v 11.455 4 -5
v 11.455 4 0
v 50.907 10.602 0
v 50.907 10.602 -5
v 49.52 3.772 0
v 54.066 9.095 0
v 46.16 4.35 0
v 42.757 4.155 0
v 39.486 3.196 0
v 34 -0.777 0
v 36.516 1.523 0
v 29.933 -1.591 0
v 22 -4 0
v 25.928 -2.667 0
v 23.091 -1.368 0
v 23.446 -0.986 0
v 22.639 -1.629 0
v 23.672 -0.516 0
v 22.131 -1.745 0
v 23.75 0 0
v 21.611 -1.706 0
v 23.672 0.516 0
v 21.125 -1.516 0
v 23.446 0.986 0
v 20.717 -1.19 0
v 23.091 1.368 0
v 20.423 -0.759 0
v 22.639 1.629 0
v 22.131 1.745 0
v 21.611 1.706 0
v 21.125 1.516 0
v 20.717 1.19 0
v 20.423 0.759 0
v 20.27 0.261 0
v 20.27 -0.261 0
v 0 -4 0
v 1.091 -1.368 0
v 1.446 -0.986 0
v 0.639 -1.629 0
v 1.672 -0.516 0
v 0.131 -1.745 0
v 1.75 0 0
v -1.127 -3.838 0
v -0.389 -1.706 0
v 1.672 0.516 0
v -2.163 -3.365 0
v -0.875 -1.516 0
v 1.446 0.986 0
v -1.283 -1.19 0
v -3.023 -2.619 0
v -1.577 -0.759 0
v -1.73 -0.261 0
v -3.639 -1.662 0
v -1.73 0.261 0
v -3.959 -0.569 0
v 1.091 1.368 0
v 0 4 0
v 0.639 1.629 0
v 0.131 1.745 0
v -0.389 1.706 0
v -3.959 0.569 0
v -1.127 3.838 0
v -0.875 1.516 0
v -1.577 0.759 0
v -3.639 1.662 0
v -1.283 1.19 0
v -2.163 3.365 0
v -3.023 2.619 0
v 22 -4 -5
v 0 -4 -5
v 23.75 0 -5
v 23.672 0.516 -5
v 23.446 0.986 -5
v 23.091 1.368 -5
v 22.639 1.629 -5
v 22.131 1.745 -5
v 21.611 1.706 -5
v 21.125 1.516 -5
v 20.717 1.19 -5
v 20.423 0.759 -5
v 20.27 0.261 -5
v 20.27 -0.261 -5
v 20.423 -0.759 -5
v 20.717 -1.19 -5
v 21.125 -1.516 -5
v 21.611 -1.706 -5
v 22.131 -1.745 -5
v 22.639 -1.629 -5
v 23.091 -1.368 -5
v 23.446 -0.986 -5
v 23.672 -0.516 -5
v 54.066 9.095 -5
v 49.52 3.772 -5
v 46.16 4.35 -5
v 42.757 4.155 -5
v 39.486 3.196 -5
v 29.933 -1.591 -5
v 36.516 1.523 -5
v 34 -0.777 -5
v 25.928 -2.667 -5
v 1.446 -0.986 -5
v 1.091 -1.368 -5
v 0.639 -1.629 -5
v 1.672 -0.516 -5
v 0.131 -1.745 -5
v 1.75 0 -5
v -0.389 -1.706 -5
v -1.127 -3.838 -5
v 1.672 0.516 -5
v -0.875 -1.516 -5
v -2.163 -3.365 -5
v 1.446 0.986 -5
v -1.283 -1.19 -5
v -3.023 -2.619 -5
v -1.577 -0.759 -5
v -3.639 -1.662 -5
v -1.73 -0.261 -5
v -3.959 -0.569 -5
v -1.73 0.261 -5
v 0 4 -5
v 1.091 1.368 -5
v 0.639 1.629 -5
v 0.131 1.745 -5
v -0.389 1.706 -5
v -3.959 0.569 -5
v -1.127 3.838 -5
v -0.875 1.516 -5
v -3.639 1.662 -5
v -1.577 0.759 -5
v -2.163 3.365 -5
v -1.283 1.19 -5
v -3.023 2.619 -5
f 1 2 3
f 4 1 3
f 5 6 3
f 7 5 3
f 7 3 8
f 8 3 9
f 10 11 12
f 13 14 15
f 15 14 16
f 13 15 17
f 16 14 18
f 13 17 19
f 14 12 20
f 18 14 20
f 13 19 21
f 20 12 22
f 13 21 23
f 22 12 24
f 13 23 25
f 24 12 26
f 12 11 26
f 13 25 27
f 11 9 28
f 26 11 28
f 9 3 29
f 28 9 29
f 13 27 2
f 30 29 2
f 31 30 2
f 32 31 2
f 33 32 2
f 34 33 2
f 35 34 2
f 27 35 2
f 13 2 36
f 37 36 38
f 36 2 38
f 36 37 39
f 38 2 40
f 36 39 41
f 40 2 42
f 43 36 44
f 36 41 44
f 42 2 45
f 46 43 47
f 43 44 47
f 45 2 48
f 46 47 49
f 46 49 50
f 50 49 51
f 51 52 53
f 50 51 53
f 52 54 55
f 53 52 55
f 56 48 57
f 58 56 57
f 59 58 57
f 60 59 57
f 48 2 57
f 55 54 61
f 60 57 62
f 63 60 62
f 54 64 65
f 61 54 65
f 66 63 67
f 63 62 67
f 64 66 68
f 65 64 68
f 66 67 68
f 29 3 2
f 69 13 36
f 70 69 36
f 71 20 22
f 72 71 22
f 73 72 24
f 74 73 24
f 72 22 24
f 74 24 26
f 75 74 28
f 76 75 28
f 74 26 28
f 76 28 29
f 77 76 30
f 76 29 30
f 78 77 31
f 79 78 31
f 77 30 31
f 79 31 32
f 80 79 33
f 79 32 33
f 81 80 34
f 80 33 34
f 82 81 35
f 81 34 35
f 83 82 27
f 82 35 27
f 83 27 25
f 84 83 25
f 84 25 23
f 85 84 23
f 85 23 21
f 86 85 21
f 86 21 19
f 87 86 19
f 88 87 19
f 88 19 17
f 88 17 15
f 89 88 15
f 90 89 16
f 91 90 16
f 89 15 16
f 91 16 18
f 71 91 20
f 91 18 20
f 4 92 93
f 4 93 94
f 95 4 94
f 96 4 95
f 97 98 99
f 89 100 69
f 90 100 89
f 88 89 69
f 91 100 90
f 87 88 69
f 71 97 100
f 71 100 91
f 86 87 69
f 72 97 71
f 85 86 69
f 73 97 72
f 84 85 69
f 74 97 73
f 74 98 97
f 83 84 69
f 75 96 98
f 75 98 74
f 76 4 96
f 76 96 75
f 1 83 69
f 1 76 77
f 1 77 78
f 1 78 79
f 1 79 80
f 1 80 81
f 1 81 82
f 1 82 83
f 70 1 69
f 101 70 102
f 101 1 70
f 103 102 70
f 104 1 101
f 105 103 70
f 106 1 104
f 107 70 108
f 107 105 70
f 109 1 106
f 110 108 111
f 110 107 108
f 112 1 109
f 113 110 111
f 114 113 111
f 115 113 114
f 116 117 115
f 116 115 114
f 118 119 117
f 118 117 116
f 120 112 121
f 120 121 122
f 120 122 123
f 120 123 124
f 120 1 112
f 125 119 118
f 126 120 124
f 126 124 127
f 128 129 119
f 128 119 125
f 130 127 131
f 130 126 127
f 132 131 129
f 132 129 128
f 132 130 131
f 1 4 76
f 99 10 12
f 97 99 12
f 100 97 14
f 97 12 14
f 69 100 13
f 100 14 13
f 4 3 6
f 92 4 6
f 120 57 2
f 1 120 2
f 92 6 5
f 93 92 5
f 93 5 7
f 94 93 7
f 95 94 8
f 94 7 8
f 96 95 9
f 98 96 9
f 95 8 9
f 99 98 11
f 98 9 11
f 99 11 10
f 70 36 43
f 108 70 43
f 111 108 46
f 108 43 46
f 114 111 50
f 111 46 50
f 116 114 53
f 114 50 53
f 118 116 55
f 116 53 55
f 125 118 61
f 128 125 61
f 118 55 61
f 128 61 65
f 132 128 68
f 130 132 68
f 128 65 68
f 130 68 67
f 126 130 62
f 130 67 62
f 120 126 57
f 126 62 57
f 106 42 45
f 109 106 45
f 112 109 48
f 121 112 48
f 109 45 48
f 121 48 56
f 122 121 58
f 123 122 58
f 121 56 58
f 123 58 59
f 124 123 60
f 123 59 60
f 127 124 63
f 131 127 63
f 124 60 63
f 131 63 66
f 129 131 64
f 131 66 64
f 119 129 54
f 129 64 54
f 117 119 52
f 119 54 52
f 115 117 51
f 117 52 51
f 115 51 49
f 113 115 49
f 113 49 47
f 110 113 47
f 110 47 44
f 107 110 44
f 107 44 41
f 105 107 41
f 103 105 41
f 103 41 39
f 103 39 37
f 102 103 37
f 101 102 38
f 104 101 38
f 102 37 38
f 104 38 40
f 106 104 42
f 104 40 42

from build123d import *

# Parameters (mm, degrees)
SKETCH1_R           = 1.75
BOSS_EXTRUDE1_DEPTH = 5


with BuildPart() as part:
    # Sketch1 → Boss-Extrude1 (new body)
    with BuildSketch(Plane.XY):
        with BuildLine():
            Line((0, 4), (11.455291715, 4))
            Line((11.455291715, 4), (50.906715776, 10.601904234))
            Line((50.906715776, 10.601904234), (54.065764272, 9.095115396))
            Line((54.065764272, 9.095115396), (49.519627933, 3.772273636))
            ThreePointArc((49.519627933, 3.772273636), (41.094269374, 3.768555825), (34, -0.776553935))
            ThreePointArc((34, -0.776553935), (27.921587079, -2.096367305), (22, -4))
            Line((22, -4), (0, -4))
            ThreePointArc((0, -4), (-4, 0), (0, 4))
        make_face()
        Circle(SKETCH1_R, mode=Mode.SUBTRACT)
        with Locations((22, 0)):
            Circle(SKETCH1_R, mode=Mode.SUBTRACT)
    extrude(amount=-BOSS_EXTRUDE1_DEPTH)


solid = part.part
